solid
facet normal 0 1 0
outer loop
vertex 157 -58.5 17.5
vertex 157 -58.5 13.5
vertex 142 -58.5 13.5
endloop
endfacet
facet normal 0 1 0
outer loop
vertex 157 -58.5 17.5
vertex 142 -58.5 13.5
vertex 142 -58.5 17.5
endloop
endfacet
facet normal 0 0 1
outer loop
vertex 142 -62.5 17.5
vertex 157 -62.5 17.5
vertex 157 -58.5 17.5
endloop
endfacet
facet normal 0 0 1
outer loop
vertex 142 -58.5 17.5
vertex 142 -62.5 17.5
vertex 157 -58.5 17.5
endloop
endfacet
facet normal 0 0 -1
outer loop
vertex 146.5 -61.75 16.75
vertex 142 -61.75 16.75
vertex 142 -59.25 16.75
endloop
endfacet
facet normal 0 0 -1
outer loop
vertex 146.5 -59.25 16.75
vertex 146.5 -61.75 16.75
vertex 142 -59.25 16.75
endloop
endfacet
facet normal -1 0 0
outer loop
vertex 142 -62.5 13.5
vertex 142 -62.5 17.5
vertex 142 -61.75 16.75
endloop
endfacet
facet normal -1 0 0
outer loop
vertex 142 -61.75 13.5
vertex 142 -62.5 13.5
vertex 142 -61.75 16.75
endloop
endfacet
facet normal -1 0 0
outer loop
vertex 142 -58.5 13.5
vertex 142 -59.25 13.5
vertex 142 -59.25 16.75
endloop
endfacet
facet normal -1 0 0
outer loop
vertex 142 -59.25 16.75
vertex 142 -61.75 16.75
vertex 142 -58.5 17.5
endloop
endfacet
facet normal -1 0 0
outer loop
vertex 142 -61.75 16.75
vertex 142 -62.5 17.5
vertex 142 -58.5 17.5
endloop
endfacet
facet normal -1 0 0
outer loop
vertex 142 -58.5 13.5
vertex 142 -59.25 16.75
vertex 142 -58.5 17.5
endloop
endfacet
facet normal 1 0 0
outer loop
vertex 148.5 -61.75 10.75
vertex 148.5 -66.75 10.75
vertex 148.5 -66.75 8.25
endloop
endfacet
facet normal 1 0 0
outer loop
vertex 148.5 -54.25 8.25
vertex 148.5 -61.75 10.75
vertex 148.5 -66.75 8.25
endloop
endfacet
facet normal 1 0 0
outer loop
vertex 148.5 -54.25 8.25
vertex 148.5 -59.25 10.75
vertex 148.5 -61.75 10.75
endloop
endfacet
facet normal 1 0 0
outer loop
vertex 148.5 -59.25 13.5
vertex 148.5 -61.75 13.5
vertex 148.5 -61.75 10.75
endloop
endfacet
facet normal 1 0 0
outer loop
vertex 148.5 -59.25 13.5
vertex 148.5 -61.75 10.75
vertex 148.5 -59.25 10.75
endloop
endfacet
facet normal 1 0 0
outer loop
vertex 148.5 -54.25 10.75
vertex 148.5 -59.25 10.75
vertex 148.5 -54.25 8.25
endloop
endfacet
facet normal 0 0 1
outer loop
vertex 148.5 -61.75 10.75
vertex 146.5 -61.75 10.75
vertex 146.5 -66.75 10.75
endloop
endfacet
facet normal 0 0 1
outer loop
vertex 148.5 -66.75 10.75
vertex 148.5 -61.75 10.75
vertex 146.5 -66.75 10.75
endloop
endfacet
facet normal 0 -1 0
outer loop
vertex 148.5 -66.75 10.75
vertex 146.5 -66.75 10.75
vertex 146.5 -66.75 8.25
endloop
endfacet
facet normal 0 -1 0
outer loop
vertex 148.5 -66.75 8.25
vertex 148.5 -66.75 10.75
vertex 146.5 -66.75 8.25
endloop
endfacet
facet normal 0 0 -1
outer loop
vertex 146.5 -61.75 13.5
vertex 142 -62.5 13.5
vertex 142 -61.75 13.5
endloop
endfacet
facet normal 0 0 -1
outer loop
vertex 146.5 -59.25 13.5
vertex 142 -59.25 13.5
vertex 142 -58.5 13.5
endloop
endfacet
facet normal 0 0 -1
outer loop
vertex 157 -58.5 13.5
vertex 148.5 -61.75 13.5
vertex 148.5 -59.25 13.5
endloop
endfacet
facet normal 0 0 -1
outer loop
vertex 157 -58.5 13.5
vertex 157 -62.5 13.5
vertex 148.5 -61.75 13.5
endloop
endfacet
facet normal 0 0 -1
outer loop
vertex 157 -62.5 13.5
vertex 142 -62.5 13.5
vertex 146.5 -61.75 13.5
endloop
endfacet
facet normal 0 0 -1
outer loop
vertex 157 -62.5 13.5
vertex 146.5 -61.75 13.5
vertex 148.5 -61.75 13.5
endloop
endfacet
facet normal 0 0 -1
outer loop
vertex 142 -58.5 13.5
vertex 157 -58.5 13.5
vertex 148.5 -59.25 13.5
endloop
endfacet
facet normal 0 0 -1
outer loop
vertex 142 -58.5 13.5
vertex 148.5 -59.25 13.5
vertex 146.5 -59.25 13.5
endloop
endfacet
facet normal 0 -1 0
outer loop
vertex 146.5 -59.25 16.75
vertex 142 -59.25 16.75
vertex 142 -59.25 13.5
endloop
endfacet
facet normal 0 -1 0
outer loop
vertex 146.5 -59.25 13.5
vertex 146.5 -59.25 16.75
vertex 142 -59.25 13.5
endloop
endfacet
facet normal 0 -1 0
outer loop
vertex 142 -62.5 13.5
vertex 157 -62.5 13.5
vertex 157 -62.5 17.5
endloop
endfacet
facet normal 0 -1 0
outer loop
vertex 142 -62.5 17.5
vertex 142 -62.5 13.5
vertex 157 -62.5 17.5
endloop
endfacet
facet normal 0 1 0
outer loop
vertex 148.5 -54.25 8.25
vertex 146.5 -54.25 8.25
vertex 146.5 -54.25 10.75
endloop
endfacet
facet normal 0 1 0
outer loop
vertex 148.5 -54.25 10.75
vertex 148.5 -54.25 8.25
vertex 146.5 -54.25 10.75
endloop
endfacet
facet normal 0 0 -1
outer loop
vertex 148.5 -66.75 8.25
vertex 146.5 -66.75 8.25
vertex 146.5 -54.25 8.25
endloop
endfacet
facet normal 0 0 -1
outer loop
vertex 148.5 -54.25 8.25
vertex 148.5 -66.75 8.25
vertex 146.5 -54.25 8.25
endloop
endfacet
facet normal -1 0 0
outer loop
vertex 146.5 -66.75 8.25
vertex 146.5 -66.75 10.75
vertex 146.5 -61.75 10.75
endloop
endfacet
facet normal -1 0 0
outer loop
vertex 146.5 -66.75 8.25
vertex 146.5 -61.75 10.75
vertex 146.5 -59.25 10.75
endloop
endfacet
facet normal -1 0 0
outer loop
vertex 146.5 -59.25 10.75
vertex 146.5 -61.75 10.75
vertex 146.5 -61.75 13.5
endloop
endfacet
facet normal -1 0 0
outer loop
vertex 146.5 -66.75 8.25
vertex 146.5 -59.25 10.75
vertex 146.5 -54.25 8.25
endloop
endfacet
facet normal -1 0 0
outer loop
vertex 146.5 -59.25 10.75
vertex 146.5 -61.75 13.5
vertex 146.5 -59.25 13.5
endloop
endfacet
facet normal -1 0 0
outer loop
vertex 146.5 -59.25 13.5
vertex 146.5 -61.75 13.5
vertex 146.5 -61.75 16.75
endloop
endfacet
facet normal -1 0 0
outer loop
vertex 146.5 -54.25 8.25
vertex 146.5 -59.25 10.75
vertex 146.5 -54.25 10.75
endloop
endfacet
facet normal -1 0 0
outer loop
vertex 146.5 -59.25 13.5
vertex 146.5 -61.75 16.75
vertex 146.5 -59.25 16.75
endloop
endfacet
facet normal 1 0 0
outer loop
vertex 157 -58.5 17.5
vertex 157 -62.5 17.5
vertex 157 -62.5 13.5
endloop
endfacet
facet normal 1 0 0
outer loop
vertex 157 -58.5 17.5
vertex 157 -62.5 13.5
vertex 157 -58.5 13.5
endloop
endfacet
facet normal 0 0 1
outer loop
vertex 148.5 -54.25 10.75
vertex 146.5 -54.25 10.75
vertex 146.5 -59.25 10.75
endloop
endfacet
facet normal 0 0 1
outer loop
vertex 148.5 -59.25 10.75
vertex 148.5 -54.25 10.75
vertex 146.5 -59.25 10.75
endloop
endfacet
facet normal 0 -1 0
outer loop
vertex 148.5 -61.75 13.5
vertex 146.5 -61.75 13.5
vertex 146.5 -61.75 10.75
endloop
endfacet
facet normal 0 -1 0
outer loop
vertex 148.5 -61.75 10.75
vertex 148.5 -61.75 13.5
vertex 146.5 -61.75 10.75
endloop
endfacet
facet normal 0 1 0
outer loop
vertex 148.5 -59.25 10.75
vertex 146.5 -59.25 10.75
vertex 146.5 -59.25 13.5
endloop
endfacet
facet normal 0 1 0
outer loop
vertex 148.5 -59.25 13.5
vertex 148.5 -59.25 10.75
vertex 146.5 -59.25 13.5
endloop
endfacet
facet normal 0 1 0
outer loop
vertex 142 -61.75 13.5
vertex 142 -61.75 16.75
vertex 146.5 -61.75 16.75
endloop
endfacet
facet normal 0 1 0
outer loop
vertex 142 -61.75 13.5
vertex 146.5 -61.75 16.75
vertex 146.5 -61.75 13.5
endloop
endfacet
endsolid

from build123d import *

# Parameters (mm, degrees)
SKETCH056_W     = 4
SKETCH056_H     = 4
PAD031_DEPTH    = 15
SKETCH057_W     = 2.5
SKETCH057_H     = 3.25
POCKET027_DEPTH = 4.5
PAD035_DEPTH    = 2


with BuildPart() as part:
    # Sketch056 → Pad031 (new body)
    with BuildSketch(Plane.YZ.offset(157)):
        with Locations((-60.5, 15.5)):
            Rectangle(SKETCH056_W, SKETCH056_H)
    extrude(amount=-PAD031_DEPTH)

    # Sketch057 (on Face6 of Pad031) → Pocket027 (cut)
    with BuildSketch(Plane(origin=(142, 0, 0), x_dir=(0, 1, 0), z_dir=(-1, 0, 0))):
        with Locations((-60.5, -15.125)):
            Rectangle(SKETCH057_W, SKETCH057_H)
    extrude(amount=-POCKET027_DEPTH, mode=Mode.SUBTRACT)

    # Sketch062 (on Face22 of Chamfer001) → Pad035 (join)
    with BuildSketch(Plane(origin=(146.5, 0, 0), x_dir=(0, -1, 0), z_dir=(-1, 0, 0))):
        Polygon((61.75, 13.5), (61.75, 10.75), (66.75, 10.75), (66.75, 8.25), (54.25, 8.25), (54.25, 10.75), (59.25, 10.75), (59.25, 13.5), align=None)
    extrude(amount=-PAD035_DEPTH)


solid = part.part
